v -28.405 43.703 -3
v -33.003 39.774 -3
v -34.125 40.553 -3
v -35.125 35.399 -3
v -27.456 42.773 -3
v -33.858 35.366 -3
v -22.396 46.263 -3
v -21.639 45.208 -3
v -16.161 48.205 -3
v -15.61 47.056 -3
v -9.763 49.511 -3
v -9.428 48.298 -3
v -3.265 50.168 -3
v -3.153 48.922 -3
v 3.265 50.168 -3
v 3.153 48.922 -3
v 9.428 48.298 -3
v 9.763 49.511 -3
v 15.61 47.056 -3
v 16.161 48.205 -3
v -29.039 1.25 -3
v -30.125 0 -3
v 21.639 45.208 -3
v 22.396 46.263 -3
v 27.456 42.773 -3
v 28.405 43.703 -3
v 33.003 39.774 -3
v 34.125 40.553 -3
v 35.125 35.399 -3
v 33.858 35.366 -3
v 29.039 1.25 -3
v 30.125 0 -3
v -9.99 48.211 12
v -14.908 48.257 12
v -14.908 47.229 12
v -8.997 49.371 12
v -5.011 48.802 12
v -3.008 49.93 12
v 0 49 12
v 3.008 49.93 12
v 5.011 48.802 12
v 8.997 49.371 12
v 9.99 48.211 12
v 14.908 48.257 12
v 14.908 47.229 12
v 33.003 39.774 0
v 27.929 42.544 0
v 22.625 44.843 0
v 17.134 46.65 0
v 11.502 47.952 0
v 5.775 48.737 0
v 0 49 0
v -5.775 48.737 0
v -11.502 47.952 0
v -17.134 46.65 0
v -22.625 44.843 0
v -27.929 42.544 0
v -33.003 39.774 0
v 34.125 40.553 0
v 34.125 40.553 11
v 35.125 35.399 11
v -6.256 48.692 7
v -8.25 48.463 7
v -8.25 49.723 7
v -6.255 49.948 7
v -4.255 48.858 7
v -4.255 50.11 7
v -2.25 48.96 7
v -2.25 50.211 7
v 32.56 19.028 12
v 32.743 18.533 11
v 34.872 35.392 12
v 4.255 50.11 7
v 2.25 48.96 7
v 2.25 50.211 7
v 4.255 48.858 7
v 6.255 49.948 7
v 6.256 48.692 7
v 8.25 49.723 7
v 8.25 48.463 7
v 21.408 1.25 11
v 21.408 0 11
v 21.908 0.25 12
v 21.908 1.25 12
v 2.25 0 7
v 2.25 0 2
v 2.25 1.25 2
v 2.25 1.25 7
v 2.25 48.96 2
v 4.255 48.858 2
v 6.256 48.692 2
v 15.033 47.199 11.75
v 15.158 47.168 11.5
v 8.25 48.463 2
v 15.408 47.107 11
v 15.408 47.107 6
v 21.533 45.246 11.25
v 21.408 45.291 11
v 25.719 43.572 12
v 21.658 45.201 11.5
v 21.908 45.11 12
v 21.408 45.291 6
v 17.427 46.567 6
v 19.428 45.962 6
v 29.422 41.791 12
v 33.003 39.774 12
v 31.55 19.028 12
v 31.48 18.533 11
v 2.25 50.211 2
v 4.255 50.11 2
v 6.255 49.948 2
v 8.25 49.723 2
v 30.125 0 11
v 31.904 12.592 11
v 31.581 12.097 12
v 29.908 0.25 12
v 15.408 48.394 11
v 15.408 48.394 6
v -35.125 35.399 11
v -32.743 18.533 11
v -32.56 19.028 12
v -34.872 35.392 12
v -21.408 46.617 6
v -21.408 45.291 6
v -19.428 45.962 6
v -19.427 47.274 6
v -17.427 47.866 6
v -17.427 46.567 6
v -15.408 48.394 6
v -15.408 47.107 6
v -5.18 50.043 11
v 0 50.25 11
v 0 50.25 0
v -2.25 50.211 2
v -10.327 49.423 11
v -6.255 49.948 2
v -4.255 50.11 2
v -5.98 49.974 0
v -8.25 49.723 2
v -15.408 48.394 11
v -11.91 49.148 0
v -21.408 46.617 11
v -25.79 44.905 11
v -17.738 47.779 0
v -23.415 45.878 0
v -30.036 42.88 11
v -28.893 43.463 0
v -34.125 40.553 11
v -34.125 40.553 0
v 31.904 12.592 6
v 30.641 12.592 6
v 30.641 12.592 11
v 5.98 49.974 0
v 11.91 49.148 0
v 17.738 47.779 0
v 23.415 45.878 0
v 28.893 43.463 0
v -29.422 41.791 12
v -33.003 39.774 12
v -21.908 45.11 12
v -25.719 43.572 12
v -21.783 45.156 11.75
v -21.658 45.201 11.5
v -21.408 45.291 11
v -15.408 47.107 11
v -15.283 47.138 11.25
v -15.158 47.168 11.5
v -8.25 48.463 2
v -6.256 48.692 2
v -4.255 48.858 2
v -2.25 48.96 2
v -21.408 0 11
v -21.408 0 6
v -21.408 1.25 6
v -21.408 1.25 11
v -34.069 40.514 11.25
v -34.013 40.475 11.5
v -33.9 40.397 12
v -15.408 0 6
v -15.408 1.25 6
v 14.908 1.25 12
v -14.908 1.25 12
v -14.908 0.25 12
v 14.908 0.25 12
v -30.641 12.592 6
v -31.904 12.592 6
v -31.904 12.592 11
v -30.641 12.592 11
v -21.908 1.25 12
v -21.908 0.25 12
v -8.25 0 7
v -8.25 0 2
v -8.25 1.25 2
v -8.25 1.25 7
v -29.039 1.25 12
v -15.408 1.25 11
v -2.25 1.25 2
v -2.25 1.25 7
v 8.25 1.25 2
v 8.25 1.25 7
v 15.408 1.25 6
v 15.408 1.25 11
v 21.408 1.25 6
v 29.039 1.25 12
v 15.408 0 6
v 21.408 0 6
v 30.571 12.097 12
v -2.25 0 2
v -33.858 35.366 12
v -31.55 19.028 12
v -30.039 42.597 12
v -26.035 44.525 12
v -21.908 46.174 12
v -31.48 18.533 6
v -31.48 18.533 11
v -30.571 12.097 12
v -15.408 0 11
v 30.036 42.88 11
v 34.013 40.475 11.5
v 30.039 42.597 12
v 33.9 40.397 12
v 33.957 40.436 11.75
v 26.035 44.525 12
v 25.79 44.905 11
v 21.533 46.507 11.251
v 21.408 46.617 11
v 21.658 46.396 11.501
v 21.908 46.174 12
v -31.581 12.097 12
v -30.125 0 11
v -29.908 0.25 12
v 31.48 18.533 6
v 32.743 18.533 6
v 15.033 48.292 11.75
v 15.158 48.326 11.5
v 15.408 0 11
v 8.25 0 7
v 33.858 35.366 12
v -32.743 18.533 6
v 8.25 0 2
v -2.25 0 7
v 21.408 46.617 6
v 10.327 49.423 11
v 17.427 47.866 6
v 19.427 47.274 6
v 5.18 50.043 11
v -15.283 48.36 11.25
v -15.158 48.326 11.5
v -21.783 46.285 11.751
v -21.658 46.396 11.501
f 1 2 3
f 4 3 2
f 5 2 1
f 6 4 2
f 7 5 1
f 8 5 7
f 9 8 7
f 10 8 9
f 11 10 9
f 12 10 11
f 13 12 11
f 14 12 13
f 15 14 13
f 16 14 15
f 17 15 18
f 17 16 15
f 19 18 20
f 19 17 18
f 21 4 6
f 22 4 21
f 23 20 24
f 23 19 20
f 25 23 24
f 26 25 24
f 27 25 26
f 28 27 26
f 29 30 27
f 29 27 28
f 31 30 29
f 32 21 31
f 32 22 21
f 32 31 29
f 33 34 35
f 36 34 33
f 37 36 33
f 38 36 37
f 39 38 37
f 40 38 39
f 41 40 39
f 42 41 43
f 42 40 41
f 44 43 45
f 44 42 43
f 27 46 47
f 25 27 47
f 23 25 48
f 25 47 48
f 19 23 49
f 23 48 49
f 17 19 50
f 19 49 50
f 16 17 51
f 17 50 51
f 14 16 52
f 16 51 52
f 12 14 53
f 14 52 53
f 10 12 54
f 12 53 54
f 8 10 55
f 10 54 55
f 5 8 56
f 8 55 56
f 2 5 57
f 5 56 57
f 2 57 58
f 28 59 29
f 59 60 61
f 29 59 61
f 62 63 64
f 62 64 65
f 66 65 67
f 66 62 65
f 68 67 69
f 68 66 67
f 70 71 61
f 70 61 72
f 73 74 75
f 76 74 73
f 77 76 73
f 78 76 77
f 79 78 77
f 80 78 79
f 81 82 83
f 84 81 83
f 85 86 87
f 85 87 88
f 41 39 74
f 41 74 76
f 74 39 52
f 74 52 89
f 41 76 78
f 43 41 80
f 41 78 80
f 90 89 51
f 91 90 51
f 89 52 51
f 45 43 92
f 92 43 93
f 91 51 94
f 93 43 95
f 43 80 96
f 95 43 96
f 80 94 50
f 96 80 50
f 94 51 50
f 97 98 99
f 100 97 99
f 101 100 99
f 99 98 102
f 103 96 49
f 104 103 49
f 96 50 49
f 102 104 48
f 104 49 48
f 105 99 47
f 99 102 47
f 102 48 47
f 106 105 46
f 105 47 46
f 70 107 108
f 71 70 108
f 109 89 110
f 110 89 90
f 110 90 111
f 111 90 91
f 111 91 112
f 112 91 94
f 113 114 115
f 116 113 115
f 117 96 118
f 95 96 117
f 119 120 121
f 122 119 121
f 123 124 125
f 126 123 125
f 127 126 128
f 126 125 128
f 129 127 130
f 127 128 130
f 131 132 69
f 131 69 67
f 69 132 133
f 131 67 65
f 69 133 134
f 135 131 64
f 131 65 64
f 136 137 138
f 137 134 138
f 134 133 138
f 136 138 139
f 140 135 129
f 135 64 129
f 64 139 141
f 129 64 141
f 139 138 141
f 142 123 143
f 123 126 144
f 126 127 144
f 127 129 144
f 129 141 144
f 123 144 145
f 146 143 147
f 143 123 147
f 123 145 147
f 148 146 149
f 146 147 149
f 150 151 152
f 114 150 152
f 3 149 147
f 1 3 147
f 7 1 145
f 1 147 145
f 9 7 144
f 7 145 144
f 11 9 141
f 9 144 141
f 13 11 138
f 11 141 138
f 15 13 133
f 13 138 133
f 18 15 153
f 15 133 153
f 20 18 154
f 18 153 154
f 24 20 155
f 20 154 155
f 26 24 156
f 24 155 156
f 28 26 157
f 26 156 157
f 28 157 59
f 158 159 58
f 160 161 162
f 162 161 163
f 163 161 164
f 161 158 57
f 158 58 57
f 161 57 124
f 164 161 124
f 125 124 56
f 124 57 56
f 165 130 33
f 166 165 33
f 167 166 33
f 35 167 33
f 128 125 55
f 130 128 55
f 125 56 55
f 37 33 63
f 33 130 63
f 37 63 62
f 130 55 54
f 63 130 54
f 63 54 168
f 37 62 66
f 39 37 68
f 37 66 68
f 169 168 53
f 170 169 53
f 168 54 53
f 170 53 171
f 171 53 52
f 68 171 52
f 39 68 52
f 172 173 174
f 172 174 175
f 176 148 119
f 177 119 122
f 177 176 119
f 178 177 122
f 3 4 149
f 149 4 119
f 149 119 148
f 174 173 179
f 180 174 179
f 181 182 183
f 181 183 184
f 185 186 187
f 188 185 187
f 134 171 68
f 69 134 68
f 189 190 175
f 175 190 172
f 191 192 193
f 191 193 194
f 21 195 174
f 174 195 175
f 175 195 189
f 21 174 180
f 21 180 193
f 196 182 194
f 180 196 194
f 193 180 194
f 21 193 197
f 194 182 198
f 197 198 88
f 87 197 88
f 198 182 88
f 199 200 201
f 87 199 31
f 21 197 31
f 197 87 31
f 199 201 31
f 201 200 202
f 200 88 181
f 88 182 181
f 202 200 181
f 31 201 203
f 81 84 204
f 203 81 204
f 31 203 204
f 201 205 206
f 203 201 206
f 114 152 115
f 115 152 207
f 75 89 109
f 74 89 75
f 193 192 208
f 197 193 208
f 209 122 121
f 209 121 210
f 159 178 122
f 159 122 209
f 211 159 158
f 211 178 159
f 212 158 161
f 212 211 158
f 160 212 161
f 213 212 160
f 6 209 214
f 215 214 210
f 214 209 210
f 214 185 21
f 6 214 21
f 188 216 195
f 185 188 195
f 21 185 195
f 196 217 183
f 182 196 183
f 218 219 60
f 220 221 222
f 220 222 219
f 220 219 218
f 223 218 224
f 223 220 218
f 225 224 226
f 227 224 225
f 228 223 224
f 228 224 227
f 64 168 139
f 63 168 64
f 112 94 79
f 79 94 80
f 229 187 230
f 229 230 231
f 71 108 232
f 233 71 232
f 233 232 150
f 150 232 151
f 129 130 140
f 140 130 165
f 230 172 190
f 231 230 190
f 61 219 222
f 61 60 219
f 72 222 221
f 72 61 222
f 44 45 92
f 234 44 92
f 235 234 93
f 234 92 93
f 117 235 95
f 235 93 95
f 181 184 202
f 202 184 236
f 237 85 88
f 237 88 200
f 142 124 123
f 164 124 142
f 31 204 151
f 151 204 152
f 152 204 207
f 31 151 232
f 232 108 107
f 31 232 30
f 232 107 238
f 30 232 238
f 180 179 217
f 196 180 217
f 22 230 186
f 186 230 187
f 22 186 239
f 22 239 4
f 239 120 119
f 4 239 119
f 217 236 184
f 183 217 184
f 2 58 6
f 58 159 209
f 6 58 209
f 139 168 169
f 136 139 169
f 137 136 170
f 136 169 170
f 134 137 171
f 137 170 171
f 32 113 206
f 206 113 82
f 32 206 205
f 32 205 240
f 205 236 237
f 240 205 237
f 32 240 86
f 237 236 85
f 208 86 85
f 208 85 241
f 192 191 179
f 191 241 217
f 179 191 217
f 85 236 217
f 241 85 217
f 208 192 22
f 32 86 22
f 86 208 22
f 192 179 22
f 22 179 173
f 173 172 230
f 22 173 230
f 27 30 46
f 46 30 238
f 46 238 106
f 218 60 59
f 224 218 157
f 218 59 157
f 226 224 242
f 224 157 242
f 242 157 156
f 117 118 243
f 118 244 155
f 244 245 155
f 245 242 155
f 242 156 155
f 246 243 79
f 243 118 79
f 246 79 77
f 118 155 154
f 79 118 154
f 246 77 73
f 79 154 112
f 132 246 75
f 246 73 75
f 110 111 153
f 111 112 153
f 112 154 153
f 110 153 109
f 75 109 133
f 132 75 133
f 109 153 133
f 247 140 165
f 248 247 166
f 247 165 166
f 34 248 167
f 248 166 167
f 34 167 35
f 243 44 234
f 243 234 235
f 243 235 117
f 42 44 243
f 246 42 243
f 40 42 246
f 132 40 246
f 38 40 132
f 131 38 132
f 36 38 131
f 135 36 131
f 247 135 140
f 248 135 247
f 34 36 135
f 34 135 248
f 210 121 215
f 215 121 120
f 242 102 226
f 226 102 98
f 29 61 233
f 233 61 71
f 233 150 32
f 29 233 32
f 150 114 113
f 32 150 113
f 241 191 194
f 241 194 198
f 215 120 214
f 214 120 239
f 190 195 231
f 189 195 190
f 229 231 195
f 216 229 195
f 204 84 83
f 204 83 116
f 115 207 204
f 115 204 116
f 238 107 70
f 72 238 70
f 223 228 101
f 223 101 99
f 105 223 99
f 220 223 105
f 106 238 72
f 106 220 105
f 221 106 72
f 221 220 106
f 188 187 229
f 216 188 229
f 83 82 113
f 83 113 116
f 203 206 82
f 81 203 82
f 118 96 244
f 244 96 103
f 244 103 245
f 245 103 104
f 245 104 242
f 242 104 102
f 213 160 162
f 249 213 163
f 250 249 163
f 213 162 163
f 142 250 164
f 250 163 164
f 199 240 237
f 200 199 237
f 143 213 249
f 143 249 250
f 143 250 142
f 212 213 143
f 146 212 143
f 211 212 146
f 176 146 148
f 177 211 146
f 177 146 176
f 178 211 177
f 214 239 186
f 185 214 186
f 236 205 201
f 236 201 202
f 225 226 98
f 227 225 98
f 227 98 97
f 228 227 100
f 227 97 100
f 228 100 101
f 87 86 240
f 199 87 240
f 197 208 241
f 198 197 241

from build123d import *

# Parameters (mm, degrees)
F1_DEPTH     = 12
F2_T1_DEPTH  = 40.9442549995
F2_T3_DEPTH  = 65.4442549995
F2_T5_DEPTH  = 40.9442549995
F2_T7_DEPTH  = 10.4442549995
F2_T9_DEPTH  = 10.4442549995
F2_T12_ANGLE = 68.042658845
F3_W         = 6
F3_H         = 5
F4_DEPTH     = 50.251
F8_DEPTH     = 70.251
F10_DEPTH    = 3


# Not quite as in the source:
# - a fillet or chamfer that OpenCascade refuses, or shapes differently, is made with other operations: its cross-section is extruded or revolved along the edge and cut away or added


with BuildPart() as f1:
    # F0 (on Top) → F1 (new body)
    with BuildSketch(Plane.XY):
        with BuildLine():
            Line((-35.125, 35.3986228546), (-30.125, 0))
            Line((-30.125, 0), (0, 0))
            Line((0, 0), (0, 1.25))
            Line((0, 1.25), (-29.0391526732, 1.25))
            Line((-29.0391526732, 1.25), (-33.8579983297, 35.3660999978))
            Line((-33.8579983297, 35.3660999978), (-33.0027387168, 39.7740071493))
            ThreePointArc((-33.0027387168, 39.7740071493), (-17.1340283274, 46.6501181236), (0, 49))
            Line((0, 49), (0, 50.25))
            ThreePointArc((0, 50.25), (-17.738073715, 47.7785625378), (-34.125, 40.5525048866))
            Line((-34.125, 40.5525048866), (-35.125, 35.3986228546))
        make_face()
        with BuildLine():
            Line((0, 1.25), (0, 0))
            Line((0, 0), (30.125, 0))
            Line((30.125, 0), (35.125, 35.3986228546))
            Line((35.125, 35.3986228546), (34.125, 40.5525048866))
            ThreePointArc((34.125, 40.5525048866), (17.738073715, 47.7785625378), (0, 50.25))
            Line((0, 50.25), (0, 49))
            ThreePointArc((0, 49), (17.1340283274, 46.6501181236), (33.0027387168, 39.7740071493))
            Line((33.0027387168, 39.7740071493), (33.8579983297, 35.3660999978))
            Line((33.8579983297, 35.3660999978), (29.0391526732, 1.25))
            Line((29.0391526732, 1.25), (0, 1.25))
        make_face()
    extrude(amount=F1_DEPTH)

    # F2: chamfer of 0.25 x 1 on 6 edges, made by hand

    # F2_s2 → F2_t1 (cut)
    with BuildSketch(Plane(origin=(-5.9525054843, 42.142099336, 0), x_dir=(0, 0, 1), z_dir=(0.1398601399, -0.9901712687, 0))):
        Polygon((11, 29.8289094684), (12, 29.5789094684), (12, 29.8289094684), align=None)
    extrude(amount=F2_T1_DEPTH, mode=Mode.SUBTRACT)

    # F2_s4 → F2_t3 (cut)
    with BuildSketch(Plane.YZ.offset(-32.7221274998)):
        Polygon((0, 11), (0.25, 12), (0, 12), align=None)
    extrude(amount=F2_T3_DEPTH, mode=Mode.SUBTRACT)

    # F2_s6 → F2_t5 (cut)
    with BuildSketch(Plane(origin=(0.2260362536, 1.6002744188, 0), x_dir=(0, 0, 1), z_dir=(0.1398601399, 0.9901712687, 0))):
        Polygon((11, 29.8289094684), (12, 29.5789094684), (12, 29.8289094684), align=None)
    extrude(amount=F2_T5_DEPTH, mode=Mode.SUBTRACT)

    # F2_s8 → F2_t7 (cut)
    with BuildSketch(Plane(origin=(-4.8500827906, 24.9967545481, 0), x_dir=(0, 0, 1), z_dir=(-0.1904761905, 0.9816918156, 0))):
        Polygon((11, 41.2245198532), (12, 40.9745198532), (12, 41.2245198532), align=None)
    extrude(amount=F2_T7_DEPTH, mode=Mode.SUBTRACT)

    # F2_s10 → F2_t9 (cut)
    with BuildSketch(Plane(origin=(6.8394646952, 35.2497942014, 0), x_dir=(0, 0, 1), z_dir=(-0.1904761905, -0.9816918156, 0))):
        Polygon((11, 41.2245198532), (12, 40.9745198532), (12, 41.2245198532), align=None)
    extrude(amount=F2_T9_DEPTH, mode=Mode.SUBTRACT)

    # F2_s11 → F2_t12 (revolve, cut)
    with BuildSketch(Plane(origin=(6.7894109874, -4.5831938529, 0), x_dir=(0, 0, 1), z_dir=(0.8288293451, -0.5595014894, 0))):
        Polygon((11, -52.7560806603), (12, -52.5060806603), (12, -52.7560806603), align=None)
    revolve(axis=Axis((0, -14.6408311763, 12), (0, 0, 1)), revolution_arc=F2_T12_ANGLE, mode=Mode.SUBTRACT)

    # F3 (on face) → F4 (cut, through all)
    with BuildSketch(Plane.XZ):
        with Locations((-18.4078305346, 8.5)):
            Rectangle(F3_W, F3_H)
        Polygon((-21.9078305346, 12), (-21.4078305346, 11), (-15.4078305346, 11), (-14.9078305346, 12), align=None)
        with Locations((18.4078305346, 8.5)):
            Rectangle(F3_W, F3_H)
        Polygon((14.9078305346, 12), (15.4078305346, 11), (21.4078305346, 11), (21.9078305346, 12), align=None)
        with Locations((-5.25, 4.5)):
            Rectangle(F3_W, F3_H)
        with Locations((5.25, 4.5)):
            Rectangle(F3_W, F3_H)
    extrude(amount=-F4_DEPTH, mode=Mode.SUBTRACT)

    # F7 (on face) → F8 (cut, through all)
    with BuildSketch(Plane(origin=(-35.125, 0, 0), x_dir=(0, -1, 0), z_dir=(-1, 0, 0))):
        Polygon((-19.0282890696, 12), (-18.5332034352, 11), (-18.5332034352, 6), (-12.5921758233, 6), (-12.5921758233, 11), (-12.0970901889, 12), align=None)
    extrude(amount=-F8_DEPTH, mode=Mode.SUBTRACT)

    # F9 (on face) + F0 (on Top) → F10 (join)
    with BuildSketch(Plane(origin=(0, 0, 0), x_dir=(1, 0, 0), z_dir=(0, 0, -1))):
        with BuildLine():
            Line((30.125, 0), (-30.125, 0))
            Line((-30.125, 0), (-35.125, -35.3986228546))
            Line((-35.125, -35.3986228546), (-34.125, -40.5525048866))
            ThreePointArc((-34.125, -40.5525048866), (0, -50.25), (34.125, -40.5525048866))
            Line((34.125, -40.5525048866), (35.125, -35.3986228546))
            Line((35.125, -35.3986228546), (30.125, 0))
        make_face()
        with BuildLine():
            Line((-33.8579983297, -35.3660999978), (-29.0391526732, -1.25))
            Line((-29.0391526732, -1.25), (29.0391526732, -1.25))
            Line((29.0391526732, -1.25), (33.8579983297, -35.3660999978))
            Line((33.8579983297, -35.3660999978), (33.0027387168, -39.7740071493))
            ThreePointArc((33.0027387168, -39.7740071493), (0, -49), (-33.0027387168, -39.7740071493))
            Line((-33.0027387168, -39.7740071493), (-33.8579983297, -35.3660999978))
        make_face(mode=Mode.SUBTRACT)
    with BuildSketch(Plane.XY):
        with BuildLine():
            Line((-35.125, 35.3986228546), (-30.125, 0))
            Line((-30.125, 0), (0, 0))
            Line((0, 0), (0, 1.25))
            Line((0, 1.25), (-29.0391526732, 1.25))
            Line((-29.0391526732, 1.25), (-33.8579983297, 35.3660999978))
            Line((-33.8579983297, 35.3660999978), (-33.0027387168, 39.7740071493))
            ThreePointArc((-33.0027387168, 39.7740071493), (-17.1340283274, 46.6501181236), (0, 49))
            Line((0, 49), (0, 50.25))
            ThreePointArc((0, 50.25), (-17.738073715, 47.7785625378), (-34.125, 40.5525048866))
            Line((-34.125, 40.5525048866), (-35.125, 35.3986228546))
        make_face()
        with BuildLine():
            Line((0, 1.25), (0, 0))
            Line((0, 0), (30.125, 0))
            Line((30.125, 0), (35.125, 35.3986228546))
            Line((35.125, 35.3986228546), (34.125, 40.5525048866))
            ThreePointArc((34.125, 40.5525048866), (17.738073715, 47.7785625378), (0, 50.25))
            Line((0, 50.25), (0, 49))
            ThreePointArc((0, 49), (17.1340283274, 46.6501181236), (33.0027387168, 39.7740071493))
            Line((33.0027387168, 39.7740071493), (33.8579983297, 35.3660999978))
            Line((33.8579983297, 35.3660999978), (29.0391526732, 1.25))
            Line((29.0391526732, 1.25), (0, 1.25))
        make_face()
    extrude(amount=F10_DEPTH, dir=(0, 0, -1))


solid = f1.part
